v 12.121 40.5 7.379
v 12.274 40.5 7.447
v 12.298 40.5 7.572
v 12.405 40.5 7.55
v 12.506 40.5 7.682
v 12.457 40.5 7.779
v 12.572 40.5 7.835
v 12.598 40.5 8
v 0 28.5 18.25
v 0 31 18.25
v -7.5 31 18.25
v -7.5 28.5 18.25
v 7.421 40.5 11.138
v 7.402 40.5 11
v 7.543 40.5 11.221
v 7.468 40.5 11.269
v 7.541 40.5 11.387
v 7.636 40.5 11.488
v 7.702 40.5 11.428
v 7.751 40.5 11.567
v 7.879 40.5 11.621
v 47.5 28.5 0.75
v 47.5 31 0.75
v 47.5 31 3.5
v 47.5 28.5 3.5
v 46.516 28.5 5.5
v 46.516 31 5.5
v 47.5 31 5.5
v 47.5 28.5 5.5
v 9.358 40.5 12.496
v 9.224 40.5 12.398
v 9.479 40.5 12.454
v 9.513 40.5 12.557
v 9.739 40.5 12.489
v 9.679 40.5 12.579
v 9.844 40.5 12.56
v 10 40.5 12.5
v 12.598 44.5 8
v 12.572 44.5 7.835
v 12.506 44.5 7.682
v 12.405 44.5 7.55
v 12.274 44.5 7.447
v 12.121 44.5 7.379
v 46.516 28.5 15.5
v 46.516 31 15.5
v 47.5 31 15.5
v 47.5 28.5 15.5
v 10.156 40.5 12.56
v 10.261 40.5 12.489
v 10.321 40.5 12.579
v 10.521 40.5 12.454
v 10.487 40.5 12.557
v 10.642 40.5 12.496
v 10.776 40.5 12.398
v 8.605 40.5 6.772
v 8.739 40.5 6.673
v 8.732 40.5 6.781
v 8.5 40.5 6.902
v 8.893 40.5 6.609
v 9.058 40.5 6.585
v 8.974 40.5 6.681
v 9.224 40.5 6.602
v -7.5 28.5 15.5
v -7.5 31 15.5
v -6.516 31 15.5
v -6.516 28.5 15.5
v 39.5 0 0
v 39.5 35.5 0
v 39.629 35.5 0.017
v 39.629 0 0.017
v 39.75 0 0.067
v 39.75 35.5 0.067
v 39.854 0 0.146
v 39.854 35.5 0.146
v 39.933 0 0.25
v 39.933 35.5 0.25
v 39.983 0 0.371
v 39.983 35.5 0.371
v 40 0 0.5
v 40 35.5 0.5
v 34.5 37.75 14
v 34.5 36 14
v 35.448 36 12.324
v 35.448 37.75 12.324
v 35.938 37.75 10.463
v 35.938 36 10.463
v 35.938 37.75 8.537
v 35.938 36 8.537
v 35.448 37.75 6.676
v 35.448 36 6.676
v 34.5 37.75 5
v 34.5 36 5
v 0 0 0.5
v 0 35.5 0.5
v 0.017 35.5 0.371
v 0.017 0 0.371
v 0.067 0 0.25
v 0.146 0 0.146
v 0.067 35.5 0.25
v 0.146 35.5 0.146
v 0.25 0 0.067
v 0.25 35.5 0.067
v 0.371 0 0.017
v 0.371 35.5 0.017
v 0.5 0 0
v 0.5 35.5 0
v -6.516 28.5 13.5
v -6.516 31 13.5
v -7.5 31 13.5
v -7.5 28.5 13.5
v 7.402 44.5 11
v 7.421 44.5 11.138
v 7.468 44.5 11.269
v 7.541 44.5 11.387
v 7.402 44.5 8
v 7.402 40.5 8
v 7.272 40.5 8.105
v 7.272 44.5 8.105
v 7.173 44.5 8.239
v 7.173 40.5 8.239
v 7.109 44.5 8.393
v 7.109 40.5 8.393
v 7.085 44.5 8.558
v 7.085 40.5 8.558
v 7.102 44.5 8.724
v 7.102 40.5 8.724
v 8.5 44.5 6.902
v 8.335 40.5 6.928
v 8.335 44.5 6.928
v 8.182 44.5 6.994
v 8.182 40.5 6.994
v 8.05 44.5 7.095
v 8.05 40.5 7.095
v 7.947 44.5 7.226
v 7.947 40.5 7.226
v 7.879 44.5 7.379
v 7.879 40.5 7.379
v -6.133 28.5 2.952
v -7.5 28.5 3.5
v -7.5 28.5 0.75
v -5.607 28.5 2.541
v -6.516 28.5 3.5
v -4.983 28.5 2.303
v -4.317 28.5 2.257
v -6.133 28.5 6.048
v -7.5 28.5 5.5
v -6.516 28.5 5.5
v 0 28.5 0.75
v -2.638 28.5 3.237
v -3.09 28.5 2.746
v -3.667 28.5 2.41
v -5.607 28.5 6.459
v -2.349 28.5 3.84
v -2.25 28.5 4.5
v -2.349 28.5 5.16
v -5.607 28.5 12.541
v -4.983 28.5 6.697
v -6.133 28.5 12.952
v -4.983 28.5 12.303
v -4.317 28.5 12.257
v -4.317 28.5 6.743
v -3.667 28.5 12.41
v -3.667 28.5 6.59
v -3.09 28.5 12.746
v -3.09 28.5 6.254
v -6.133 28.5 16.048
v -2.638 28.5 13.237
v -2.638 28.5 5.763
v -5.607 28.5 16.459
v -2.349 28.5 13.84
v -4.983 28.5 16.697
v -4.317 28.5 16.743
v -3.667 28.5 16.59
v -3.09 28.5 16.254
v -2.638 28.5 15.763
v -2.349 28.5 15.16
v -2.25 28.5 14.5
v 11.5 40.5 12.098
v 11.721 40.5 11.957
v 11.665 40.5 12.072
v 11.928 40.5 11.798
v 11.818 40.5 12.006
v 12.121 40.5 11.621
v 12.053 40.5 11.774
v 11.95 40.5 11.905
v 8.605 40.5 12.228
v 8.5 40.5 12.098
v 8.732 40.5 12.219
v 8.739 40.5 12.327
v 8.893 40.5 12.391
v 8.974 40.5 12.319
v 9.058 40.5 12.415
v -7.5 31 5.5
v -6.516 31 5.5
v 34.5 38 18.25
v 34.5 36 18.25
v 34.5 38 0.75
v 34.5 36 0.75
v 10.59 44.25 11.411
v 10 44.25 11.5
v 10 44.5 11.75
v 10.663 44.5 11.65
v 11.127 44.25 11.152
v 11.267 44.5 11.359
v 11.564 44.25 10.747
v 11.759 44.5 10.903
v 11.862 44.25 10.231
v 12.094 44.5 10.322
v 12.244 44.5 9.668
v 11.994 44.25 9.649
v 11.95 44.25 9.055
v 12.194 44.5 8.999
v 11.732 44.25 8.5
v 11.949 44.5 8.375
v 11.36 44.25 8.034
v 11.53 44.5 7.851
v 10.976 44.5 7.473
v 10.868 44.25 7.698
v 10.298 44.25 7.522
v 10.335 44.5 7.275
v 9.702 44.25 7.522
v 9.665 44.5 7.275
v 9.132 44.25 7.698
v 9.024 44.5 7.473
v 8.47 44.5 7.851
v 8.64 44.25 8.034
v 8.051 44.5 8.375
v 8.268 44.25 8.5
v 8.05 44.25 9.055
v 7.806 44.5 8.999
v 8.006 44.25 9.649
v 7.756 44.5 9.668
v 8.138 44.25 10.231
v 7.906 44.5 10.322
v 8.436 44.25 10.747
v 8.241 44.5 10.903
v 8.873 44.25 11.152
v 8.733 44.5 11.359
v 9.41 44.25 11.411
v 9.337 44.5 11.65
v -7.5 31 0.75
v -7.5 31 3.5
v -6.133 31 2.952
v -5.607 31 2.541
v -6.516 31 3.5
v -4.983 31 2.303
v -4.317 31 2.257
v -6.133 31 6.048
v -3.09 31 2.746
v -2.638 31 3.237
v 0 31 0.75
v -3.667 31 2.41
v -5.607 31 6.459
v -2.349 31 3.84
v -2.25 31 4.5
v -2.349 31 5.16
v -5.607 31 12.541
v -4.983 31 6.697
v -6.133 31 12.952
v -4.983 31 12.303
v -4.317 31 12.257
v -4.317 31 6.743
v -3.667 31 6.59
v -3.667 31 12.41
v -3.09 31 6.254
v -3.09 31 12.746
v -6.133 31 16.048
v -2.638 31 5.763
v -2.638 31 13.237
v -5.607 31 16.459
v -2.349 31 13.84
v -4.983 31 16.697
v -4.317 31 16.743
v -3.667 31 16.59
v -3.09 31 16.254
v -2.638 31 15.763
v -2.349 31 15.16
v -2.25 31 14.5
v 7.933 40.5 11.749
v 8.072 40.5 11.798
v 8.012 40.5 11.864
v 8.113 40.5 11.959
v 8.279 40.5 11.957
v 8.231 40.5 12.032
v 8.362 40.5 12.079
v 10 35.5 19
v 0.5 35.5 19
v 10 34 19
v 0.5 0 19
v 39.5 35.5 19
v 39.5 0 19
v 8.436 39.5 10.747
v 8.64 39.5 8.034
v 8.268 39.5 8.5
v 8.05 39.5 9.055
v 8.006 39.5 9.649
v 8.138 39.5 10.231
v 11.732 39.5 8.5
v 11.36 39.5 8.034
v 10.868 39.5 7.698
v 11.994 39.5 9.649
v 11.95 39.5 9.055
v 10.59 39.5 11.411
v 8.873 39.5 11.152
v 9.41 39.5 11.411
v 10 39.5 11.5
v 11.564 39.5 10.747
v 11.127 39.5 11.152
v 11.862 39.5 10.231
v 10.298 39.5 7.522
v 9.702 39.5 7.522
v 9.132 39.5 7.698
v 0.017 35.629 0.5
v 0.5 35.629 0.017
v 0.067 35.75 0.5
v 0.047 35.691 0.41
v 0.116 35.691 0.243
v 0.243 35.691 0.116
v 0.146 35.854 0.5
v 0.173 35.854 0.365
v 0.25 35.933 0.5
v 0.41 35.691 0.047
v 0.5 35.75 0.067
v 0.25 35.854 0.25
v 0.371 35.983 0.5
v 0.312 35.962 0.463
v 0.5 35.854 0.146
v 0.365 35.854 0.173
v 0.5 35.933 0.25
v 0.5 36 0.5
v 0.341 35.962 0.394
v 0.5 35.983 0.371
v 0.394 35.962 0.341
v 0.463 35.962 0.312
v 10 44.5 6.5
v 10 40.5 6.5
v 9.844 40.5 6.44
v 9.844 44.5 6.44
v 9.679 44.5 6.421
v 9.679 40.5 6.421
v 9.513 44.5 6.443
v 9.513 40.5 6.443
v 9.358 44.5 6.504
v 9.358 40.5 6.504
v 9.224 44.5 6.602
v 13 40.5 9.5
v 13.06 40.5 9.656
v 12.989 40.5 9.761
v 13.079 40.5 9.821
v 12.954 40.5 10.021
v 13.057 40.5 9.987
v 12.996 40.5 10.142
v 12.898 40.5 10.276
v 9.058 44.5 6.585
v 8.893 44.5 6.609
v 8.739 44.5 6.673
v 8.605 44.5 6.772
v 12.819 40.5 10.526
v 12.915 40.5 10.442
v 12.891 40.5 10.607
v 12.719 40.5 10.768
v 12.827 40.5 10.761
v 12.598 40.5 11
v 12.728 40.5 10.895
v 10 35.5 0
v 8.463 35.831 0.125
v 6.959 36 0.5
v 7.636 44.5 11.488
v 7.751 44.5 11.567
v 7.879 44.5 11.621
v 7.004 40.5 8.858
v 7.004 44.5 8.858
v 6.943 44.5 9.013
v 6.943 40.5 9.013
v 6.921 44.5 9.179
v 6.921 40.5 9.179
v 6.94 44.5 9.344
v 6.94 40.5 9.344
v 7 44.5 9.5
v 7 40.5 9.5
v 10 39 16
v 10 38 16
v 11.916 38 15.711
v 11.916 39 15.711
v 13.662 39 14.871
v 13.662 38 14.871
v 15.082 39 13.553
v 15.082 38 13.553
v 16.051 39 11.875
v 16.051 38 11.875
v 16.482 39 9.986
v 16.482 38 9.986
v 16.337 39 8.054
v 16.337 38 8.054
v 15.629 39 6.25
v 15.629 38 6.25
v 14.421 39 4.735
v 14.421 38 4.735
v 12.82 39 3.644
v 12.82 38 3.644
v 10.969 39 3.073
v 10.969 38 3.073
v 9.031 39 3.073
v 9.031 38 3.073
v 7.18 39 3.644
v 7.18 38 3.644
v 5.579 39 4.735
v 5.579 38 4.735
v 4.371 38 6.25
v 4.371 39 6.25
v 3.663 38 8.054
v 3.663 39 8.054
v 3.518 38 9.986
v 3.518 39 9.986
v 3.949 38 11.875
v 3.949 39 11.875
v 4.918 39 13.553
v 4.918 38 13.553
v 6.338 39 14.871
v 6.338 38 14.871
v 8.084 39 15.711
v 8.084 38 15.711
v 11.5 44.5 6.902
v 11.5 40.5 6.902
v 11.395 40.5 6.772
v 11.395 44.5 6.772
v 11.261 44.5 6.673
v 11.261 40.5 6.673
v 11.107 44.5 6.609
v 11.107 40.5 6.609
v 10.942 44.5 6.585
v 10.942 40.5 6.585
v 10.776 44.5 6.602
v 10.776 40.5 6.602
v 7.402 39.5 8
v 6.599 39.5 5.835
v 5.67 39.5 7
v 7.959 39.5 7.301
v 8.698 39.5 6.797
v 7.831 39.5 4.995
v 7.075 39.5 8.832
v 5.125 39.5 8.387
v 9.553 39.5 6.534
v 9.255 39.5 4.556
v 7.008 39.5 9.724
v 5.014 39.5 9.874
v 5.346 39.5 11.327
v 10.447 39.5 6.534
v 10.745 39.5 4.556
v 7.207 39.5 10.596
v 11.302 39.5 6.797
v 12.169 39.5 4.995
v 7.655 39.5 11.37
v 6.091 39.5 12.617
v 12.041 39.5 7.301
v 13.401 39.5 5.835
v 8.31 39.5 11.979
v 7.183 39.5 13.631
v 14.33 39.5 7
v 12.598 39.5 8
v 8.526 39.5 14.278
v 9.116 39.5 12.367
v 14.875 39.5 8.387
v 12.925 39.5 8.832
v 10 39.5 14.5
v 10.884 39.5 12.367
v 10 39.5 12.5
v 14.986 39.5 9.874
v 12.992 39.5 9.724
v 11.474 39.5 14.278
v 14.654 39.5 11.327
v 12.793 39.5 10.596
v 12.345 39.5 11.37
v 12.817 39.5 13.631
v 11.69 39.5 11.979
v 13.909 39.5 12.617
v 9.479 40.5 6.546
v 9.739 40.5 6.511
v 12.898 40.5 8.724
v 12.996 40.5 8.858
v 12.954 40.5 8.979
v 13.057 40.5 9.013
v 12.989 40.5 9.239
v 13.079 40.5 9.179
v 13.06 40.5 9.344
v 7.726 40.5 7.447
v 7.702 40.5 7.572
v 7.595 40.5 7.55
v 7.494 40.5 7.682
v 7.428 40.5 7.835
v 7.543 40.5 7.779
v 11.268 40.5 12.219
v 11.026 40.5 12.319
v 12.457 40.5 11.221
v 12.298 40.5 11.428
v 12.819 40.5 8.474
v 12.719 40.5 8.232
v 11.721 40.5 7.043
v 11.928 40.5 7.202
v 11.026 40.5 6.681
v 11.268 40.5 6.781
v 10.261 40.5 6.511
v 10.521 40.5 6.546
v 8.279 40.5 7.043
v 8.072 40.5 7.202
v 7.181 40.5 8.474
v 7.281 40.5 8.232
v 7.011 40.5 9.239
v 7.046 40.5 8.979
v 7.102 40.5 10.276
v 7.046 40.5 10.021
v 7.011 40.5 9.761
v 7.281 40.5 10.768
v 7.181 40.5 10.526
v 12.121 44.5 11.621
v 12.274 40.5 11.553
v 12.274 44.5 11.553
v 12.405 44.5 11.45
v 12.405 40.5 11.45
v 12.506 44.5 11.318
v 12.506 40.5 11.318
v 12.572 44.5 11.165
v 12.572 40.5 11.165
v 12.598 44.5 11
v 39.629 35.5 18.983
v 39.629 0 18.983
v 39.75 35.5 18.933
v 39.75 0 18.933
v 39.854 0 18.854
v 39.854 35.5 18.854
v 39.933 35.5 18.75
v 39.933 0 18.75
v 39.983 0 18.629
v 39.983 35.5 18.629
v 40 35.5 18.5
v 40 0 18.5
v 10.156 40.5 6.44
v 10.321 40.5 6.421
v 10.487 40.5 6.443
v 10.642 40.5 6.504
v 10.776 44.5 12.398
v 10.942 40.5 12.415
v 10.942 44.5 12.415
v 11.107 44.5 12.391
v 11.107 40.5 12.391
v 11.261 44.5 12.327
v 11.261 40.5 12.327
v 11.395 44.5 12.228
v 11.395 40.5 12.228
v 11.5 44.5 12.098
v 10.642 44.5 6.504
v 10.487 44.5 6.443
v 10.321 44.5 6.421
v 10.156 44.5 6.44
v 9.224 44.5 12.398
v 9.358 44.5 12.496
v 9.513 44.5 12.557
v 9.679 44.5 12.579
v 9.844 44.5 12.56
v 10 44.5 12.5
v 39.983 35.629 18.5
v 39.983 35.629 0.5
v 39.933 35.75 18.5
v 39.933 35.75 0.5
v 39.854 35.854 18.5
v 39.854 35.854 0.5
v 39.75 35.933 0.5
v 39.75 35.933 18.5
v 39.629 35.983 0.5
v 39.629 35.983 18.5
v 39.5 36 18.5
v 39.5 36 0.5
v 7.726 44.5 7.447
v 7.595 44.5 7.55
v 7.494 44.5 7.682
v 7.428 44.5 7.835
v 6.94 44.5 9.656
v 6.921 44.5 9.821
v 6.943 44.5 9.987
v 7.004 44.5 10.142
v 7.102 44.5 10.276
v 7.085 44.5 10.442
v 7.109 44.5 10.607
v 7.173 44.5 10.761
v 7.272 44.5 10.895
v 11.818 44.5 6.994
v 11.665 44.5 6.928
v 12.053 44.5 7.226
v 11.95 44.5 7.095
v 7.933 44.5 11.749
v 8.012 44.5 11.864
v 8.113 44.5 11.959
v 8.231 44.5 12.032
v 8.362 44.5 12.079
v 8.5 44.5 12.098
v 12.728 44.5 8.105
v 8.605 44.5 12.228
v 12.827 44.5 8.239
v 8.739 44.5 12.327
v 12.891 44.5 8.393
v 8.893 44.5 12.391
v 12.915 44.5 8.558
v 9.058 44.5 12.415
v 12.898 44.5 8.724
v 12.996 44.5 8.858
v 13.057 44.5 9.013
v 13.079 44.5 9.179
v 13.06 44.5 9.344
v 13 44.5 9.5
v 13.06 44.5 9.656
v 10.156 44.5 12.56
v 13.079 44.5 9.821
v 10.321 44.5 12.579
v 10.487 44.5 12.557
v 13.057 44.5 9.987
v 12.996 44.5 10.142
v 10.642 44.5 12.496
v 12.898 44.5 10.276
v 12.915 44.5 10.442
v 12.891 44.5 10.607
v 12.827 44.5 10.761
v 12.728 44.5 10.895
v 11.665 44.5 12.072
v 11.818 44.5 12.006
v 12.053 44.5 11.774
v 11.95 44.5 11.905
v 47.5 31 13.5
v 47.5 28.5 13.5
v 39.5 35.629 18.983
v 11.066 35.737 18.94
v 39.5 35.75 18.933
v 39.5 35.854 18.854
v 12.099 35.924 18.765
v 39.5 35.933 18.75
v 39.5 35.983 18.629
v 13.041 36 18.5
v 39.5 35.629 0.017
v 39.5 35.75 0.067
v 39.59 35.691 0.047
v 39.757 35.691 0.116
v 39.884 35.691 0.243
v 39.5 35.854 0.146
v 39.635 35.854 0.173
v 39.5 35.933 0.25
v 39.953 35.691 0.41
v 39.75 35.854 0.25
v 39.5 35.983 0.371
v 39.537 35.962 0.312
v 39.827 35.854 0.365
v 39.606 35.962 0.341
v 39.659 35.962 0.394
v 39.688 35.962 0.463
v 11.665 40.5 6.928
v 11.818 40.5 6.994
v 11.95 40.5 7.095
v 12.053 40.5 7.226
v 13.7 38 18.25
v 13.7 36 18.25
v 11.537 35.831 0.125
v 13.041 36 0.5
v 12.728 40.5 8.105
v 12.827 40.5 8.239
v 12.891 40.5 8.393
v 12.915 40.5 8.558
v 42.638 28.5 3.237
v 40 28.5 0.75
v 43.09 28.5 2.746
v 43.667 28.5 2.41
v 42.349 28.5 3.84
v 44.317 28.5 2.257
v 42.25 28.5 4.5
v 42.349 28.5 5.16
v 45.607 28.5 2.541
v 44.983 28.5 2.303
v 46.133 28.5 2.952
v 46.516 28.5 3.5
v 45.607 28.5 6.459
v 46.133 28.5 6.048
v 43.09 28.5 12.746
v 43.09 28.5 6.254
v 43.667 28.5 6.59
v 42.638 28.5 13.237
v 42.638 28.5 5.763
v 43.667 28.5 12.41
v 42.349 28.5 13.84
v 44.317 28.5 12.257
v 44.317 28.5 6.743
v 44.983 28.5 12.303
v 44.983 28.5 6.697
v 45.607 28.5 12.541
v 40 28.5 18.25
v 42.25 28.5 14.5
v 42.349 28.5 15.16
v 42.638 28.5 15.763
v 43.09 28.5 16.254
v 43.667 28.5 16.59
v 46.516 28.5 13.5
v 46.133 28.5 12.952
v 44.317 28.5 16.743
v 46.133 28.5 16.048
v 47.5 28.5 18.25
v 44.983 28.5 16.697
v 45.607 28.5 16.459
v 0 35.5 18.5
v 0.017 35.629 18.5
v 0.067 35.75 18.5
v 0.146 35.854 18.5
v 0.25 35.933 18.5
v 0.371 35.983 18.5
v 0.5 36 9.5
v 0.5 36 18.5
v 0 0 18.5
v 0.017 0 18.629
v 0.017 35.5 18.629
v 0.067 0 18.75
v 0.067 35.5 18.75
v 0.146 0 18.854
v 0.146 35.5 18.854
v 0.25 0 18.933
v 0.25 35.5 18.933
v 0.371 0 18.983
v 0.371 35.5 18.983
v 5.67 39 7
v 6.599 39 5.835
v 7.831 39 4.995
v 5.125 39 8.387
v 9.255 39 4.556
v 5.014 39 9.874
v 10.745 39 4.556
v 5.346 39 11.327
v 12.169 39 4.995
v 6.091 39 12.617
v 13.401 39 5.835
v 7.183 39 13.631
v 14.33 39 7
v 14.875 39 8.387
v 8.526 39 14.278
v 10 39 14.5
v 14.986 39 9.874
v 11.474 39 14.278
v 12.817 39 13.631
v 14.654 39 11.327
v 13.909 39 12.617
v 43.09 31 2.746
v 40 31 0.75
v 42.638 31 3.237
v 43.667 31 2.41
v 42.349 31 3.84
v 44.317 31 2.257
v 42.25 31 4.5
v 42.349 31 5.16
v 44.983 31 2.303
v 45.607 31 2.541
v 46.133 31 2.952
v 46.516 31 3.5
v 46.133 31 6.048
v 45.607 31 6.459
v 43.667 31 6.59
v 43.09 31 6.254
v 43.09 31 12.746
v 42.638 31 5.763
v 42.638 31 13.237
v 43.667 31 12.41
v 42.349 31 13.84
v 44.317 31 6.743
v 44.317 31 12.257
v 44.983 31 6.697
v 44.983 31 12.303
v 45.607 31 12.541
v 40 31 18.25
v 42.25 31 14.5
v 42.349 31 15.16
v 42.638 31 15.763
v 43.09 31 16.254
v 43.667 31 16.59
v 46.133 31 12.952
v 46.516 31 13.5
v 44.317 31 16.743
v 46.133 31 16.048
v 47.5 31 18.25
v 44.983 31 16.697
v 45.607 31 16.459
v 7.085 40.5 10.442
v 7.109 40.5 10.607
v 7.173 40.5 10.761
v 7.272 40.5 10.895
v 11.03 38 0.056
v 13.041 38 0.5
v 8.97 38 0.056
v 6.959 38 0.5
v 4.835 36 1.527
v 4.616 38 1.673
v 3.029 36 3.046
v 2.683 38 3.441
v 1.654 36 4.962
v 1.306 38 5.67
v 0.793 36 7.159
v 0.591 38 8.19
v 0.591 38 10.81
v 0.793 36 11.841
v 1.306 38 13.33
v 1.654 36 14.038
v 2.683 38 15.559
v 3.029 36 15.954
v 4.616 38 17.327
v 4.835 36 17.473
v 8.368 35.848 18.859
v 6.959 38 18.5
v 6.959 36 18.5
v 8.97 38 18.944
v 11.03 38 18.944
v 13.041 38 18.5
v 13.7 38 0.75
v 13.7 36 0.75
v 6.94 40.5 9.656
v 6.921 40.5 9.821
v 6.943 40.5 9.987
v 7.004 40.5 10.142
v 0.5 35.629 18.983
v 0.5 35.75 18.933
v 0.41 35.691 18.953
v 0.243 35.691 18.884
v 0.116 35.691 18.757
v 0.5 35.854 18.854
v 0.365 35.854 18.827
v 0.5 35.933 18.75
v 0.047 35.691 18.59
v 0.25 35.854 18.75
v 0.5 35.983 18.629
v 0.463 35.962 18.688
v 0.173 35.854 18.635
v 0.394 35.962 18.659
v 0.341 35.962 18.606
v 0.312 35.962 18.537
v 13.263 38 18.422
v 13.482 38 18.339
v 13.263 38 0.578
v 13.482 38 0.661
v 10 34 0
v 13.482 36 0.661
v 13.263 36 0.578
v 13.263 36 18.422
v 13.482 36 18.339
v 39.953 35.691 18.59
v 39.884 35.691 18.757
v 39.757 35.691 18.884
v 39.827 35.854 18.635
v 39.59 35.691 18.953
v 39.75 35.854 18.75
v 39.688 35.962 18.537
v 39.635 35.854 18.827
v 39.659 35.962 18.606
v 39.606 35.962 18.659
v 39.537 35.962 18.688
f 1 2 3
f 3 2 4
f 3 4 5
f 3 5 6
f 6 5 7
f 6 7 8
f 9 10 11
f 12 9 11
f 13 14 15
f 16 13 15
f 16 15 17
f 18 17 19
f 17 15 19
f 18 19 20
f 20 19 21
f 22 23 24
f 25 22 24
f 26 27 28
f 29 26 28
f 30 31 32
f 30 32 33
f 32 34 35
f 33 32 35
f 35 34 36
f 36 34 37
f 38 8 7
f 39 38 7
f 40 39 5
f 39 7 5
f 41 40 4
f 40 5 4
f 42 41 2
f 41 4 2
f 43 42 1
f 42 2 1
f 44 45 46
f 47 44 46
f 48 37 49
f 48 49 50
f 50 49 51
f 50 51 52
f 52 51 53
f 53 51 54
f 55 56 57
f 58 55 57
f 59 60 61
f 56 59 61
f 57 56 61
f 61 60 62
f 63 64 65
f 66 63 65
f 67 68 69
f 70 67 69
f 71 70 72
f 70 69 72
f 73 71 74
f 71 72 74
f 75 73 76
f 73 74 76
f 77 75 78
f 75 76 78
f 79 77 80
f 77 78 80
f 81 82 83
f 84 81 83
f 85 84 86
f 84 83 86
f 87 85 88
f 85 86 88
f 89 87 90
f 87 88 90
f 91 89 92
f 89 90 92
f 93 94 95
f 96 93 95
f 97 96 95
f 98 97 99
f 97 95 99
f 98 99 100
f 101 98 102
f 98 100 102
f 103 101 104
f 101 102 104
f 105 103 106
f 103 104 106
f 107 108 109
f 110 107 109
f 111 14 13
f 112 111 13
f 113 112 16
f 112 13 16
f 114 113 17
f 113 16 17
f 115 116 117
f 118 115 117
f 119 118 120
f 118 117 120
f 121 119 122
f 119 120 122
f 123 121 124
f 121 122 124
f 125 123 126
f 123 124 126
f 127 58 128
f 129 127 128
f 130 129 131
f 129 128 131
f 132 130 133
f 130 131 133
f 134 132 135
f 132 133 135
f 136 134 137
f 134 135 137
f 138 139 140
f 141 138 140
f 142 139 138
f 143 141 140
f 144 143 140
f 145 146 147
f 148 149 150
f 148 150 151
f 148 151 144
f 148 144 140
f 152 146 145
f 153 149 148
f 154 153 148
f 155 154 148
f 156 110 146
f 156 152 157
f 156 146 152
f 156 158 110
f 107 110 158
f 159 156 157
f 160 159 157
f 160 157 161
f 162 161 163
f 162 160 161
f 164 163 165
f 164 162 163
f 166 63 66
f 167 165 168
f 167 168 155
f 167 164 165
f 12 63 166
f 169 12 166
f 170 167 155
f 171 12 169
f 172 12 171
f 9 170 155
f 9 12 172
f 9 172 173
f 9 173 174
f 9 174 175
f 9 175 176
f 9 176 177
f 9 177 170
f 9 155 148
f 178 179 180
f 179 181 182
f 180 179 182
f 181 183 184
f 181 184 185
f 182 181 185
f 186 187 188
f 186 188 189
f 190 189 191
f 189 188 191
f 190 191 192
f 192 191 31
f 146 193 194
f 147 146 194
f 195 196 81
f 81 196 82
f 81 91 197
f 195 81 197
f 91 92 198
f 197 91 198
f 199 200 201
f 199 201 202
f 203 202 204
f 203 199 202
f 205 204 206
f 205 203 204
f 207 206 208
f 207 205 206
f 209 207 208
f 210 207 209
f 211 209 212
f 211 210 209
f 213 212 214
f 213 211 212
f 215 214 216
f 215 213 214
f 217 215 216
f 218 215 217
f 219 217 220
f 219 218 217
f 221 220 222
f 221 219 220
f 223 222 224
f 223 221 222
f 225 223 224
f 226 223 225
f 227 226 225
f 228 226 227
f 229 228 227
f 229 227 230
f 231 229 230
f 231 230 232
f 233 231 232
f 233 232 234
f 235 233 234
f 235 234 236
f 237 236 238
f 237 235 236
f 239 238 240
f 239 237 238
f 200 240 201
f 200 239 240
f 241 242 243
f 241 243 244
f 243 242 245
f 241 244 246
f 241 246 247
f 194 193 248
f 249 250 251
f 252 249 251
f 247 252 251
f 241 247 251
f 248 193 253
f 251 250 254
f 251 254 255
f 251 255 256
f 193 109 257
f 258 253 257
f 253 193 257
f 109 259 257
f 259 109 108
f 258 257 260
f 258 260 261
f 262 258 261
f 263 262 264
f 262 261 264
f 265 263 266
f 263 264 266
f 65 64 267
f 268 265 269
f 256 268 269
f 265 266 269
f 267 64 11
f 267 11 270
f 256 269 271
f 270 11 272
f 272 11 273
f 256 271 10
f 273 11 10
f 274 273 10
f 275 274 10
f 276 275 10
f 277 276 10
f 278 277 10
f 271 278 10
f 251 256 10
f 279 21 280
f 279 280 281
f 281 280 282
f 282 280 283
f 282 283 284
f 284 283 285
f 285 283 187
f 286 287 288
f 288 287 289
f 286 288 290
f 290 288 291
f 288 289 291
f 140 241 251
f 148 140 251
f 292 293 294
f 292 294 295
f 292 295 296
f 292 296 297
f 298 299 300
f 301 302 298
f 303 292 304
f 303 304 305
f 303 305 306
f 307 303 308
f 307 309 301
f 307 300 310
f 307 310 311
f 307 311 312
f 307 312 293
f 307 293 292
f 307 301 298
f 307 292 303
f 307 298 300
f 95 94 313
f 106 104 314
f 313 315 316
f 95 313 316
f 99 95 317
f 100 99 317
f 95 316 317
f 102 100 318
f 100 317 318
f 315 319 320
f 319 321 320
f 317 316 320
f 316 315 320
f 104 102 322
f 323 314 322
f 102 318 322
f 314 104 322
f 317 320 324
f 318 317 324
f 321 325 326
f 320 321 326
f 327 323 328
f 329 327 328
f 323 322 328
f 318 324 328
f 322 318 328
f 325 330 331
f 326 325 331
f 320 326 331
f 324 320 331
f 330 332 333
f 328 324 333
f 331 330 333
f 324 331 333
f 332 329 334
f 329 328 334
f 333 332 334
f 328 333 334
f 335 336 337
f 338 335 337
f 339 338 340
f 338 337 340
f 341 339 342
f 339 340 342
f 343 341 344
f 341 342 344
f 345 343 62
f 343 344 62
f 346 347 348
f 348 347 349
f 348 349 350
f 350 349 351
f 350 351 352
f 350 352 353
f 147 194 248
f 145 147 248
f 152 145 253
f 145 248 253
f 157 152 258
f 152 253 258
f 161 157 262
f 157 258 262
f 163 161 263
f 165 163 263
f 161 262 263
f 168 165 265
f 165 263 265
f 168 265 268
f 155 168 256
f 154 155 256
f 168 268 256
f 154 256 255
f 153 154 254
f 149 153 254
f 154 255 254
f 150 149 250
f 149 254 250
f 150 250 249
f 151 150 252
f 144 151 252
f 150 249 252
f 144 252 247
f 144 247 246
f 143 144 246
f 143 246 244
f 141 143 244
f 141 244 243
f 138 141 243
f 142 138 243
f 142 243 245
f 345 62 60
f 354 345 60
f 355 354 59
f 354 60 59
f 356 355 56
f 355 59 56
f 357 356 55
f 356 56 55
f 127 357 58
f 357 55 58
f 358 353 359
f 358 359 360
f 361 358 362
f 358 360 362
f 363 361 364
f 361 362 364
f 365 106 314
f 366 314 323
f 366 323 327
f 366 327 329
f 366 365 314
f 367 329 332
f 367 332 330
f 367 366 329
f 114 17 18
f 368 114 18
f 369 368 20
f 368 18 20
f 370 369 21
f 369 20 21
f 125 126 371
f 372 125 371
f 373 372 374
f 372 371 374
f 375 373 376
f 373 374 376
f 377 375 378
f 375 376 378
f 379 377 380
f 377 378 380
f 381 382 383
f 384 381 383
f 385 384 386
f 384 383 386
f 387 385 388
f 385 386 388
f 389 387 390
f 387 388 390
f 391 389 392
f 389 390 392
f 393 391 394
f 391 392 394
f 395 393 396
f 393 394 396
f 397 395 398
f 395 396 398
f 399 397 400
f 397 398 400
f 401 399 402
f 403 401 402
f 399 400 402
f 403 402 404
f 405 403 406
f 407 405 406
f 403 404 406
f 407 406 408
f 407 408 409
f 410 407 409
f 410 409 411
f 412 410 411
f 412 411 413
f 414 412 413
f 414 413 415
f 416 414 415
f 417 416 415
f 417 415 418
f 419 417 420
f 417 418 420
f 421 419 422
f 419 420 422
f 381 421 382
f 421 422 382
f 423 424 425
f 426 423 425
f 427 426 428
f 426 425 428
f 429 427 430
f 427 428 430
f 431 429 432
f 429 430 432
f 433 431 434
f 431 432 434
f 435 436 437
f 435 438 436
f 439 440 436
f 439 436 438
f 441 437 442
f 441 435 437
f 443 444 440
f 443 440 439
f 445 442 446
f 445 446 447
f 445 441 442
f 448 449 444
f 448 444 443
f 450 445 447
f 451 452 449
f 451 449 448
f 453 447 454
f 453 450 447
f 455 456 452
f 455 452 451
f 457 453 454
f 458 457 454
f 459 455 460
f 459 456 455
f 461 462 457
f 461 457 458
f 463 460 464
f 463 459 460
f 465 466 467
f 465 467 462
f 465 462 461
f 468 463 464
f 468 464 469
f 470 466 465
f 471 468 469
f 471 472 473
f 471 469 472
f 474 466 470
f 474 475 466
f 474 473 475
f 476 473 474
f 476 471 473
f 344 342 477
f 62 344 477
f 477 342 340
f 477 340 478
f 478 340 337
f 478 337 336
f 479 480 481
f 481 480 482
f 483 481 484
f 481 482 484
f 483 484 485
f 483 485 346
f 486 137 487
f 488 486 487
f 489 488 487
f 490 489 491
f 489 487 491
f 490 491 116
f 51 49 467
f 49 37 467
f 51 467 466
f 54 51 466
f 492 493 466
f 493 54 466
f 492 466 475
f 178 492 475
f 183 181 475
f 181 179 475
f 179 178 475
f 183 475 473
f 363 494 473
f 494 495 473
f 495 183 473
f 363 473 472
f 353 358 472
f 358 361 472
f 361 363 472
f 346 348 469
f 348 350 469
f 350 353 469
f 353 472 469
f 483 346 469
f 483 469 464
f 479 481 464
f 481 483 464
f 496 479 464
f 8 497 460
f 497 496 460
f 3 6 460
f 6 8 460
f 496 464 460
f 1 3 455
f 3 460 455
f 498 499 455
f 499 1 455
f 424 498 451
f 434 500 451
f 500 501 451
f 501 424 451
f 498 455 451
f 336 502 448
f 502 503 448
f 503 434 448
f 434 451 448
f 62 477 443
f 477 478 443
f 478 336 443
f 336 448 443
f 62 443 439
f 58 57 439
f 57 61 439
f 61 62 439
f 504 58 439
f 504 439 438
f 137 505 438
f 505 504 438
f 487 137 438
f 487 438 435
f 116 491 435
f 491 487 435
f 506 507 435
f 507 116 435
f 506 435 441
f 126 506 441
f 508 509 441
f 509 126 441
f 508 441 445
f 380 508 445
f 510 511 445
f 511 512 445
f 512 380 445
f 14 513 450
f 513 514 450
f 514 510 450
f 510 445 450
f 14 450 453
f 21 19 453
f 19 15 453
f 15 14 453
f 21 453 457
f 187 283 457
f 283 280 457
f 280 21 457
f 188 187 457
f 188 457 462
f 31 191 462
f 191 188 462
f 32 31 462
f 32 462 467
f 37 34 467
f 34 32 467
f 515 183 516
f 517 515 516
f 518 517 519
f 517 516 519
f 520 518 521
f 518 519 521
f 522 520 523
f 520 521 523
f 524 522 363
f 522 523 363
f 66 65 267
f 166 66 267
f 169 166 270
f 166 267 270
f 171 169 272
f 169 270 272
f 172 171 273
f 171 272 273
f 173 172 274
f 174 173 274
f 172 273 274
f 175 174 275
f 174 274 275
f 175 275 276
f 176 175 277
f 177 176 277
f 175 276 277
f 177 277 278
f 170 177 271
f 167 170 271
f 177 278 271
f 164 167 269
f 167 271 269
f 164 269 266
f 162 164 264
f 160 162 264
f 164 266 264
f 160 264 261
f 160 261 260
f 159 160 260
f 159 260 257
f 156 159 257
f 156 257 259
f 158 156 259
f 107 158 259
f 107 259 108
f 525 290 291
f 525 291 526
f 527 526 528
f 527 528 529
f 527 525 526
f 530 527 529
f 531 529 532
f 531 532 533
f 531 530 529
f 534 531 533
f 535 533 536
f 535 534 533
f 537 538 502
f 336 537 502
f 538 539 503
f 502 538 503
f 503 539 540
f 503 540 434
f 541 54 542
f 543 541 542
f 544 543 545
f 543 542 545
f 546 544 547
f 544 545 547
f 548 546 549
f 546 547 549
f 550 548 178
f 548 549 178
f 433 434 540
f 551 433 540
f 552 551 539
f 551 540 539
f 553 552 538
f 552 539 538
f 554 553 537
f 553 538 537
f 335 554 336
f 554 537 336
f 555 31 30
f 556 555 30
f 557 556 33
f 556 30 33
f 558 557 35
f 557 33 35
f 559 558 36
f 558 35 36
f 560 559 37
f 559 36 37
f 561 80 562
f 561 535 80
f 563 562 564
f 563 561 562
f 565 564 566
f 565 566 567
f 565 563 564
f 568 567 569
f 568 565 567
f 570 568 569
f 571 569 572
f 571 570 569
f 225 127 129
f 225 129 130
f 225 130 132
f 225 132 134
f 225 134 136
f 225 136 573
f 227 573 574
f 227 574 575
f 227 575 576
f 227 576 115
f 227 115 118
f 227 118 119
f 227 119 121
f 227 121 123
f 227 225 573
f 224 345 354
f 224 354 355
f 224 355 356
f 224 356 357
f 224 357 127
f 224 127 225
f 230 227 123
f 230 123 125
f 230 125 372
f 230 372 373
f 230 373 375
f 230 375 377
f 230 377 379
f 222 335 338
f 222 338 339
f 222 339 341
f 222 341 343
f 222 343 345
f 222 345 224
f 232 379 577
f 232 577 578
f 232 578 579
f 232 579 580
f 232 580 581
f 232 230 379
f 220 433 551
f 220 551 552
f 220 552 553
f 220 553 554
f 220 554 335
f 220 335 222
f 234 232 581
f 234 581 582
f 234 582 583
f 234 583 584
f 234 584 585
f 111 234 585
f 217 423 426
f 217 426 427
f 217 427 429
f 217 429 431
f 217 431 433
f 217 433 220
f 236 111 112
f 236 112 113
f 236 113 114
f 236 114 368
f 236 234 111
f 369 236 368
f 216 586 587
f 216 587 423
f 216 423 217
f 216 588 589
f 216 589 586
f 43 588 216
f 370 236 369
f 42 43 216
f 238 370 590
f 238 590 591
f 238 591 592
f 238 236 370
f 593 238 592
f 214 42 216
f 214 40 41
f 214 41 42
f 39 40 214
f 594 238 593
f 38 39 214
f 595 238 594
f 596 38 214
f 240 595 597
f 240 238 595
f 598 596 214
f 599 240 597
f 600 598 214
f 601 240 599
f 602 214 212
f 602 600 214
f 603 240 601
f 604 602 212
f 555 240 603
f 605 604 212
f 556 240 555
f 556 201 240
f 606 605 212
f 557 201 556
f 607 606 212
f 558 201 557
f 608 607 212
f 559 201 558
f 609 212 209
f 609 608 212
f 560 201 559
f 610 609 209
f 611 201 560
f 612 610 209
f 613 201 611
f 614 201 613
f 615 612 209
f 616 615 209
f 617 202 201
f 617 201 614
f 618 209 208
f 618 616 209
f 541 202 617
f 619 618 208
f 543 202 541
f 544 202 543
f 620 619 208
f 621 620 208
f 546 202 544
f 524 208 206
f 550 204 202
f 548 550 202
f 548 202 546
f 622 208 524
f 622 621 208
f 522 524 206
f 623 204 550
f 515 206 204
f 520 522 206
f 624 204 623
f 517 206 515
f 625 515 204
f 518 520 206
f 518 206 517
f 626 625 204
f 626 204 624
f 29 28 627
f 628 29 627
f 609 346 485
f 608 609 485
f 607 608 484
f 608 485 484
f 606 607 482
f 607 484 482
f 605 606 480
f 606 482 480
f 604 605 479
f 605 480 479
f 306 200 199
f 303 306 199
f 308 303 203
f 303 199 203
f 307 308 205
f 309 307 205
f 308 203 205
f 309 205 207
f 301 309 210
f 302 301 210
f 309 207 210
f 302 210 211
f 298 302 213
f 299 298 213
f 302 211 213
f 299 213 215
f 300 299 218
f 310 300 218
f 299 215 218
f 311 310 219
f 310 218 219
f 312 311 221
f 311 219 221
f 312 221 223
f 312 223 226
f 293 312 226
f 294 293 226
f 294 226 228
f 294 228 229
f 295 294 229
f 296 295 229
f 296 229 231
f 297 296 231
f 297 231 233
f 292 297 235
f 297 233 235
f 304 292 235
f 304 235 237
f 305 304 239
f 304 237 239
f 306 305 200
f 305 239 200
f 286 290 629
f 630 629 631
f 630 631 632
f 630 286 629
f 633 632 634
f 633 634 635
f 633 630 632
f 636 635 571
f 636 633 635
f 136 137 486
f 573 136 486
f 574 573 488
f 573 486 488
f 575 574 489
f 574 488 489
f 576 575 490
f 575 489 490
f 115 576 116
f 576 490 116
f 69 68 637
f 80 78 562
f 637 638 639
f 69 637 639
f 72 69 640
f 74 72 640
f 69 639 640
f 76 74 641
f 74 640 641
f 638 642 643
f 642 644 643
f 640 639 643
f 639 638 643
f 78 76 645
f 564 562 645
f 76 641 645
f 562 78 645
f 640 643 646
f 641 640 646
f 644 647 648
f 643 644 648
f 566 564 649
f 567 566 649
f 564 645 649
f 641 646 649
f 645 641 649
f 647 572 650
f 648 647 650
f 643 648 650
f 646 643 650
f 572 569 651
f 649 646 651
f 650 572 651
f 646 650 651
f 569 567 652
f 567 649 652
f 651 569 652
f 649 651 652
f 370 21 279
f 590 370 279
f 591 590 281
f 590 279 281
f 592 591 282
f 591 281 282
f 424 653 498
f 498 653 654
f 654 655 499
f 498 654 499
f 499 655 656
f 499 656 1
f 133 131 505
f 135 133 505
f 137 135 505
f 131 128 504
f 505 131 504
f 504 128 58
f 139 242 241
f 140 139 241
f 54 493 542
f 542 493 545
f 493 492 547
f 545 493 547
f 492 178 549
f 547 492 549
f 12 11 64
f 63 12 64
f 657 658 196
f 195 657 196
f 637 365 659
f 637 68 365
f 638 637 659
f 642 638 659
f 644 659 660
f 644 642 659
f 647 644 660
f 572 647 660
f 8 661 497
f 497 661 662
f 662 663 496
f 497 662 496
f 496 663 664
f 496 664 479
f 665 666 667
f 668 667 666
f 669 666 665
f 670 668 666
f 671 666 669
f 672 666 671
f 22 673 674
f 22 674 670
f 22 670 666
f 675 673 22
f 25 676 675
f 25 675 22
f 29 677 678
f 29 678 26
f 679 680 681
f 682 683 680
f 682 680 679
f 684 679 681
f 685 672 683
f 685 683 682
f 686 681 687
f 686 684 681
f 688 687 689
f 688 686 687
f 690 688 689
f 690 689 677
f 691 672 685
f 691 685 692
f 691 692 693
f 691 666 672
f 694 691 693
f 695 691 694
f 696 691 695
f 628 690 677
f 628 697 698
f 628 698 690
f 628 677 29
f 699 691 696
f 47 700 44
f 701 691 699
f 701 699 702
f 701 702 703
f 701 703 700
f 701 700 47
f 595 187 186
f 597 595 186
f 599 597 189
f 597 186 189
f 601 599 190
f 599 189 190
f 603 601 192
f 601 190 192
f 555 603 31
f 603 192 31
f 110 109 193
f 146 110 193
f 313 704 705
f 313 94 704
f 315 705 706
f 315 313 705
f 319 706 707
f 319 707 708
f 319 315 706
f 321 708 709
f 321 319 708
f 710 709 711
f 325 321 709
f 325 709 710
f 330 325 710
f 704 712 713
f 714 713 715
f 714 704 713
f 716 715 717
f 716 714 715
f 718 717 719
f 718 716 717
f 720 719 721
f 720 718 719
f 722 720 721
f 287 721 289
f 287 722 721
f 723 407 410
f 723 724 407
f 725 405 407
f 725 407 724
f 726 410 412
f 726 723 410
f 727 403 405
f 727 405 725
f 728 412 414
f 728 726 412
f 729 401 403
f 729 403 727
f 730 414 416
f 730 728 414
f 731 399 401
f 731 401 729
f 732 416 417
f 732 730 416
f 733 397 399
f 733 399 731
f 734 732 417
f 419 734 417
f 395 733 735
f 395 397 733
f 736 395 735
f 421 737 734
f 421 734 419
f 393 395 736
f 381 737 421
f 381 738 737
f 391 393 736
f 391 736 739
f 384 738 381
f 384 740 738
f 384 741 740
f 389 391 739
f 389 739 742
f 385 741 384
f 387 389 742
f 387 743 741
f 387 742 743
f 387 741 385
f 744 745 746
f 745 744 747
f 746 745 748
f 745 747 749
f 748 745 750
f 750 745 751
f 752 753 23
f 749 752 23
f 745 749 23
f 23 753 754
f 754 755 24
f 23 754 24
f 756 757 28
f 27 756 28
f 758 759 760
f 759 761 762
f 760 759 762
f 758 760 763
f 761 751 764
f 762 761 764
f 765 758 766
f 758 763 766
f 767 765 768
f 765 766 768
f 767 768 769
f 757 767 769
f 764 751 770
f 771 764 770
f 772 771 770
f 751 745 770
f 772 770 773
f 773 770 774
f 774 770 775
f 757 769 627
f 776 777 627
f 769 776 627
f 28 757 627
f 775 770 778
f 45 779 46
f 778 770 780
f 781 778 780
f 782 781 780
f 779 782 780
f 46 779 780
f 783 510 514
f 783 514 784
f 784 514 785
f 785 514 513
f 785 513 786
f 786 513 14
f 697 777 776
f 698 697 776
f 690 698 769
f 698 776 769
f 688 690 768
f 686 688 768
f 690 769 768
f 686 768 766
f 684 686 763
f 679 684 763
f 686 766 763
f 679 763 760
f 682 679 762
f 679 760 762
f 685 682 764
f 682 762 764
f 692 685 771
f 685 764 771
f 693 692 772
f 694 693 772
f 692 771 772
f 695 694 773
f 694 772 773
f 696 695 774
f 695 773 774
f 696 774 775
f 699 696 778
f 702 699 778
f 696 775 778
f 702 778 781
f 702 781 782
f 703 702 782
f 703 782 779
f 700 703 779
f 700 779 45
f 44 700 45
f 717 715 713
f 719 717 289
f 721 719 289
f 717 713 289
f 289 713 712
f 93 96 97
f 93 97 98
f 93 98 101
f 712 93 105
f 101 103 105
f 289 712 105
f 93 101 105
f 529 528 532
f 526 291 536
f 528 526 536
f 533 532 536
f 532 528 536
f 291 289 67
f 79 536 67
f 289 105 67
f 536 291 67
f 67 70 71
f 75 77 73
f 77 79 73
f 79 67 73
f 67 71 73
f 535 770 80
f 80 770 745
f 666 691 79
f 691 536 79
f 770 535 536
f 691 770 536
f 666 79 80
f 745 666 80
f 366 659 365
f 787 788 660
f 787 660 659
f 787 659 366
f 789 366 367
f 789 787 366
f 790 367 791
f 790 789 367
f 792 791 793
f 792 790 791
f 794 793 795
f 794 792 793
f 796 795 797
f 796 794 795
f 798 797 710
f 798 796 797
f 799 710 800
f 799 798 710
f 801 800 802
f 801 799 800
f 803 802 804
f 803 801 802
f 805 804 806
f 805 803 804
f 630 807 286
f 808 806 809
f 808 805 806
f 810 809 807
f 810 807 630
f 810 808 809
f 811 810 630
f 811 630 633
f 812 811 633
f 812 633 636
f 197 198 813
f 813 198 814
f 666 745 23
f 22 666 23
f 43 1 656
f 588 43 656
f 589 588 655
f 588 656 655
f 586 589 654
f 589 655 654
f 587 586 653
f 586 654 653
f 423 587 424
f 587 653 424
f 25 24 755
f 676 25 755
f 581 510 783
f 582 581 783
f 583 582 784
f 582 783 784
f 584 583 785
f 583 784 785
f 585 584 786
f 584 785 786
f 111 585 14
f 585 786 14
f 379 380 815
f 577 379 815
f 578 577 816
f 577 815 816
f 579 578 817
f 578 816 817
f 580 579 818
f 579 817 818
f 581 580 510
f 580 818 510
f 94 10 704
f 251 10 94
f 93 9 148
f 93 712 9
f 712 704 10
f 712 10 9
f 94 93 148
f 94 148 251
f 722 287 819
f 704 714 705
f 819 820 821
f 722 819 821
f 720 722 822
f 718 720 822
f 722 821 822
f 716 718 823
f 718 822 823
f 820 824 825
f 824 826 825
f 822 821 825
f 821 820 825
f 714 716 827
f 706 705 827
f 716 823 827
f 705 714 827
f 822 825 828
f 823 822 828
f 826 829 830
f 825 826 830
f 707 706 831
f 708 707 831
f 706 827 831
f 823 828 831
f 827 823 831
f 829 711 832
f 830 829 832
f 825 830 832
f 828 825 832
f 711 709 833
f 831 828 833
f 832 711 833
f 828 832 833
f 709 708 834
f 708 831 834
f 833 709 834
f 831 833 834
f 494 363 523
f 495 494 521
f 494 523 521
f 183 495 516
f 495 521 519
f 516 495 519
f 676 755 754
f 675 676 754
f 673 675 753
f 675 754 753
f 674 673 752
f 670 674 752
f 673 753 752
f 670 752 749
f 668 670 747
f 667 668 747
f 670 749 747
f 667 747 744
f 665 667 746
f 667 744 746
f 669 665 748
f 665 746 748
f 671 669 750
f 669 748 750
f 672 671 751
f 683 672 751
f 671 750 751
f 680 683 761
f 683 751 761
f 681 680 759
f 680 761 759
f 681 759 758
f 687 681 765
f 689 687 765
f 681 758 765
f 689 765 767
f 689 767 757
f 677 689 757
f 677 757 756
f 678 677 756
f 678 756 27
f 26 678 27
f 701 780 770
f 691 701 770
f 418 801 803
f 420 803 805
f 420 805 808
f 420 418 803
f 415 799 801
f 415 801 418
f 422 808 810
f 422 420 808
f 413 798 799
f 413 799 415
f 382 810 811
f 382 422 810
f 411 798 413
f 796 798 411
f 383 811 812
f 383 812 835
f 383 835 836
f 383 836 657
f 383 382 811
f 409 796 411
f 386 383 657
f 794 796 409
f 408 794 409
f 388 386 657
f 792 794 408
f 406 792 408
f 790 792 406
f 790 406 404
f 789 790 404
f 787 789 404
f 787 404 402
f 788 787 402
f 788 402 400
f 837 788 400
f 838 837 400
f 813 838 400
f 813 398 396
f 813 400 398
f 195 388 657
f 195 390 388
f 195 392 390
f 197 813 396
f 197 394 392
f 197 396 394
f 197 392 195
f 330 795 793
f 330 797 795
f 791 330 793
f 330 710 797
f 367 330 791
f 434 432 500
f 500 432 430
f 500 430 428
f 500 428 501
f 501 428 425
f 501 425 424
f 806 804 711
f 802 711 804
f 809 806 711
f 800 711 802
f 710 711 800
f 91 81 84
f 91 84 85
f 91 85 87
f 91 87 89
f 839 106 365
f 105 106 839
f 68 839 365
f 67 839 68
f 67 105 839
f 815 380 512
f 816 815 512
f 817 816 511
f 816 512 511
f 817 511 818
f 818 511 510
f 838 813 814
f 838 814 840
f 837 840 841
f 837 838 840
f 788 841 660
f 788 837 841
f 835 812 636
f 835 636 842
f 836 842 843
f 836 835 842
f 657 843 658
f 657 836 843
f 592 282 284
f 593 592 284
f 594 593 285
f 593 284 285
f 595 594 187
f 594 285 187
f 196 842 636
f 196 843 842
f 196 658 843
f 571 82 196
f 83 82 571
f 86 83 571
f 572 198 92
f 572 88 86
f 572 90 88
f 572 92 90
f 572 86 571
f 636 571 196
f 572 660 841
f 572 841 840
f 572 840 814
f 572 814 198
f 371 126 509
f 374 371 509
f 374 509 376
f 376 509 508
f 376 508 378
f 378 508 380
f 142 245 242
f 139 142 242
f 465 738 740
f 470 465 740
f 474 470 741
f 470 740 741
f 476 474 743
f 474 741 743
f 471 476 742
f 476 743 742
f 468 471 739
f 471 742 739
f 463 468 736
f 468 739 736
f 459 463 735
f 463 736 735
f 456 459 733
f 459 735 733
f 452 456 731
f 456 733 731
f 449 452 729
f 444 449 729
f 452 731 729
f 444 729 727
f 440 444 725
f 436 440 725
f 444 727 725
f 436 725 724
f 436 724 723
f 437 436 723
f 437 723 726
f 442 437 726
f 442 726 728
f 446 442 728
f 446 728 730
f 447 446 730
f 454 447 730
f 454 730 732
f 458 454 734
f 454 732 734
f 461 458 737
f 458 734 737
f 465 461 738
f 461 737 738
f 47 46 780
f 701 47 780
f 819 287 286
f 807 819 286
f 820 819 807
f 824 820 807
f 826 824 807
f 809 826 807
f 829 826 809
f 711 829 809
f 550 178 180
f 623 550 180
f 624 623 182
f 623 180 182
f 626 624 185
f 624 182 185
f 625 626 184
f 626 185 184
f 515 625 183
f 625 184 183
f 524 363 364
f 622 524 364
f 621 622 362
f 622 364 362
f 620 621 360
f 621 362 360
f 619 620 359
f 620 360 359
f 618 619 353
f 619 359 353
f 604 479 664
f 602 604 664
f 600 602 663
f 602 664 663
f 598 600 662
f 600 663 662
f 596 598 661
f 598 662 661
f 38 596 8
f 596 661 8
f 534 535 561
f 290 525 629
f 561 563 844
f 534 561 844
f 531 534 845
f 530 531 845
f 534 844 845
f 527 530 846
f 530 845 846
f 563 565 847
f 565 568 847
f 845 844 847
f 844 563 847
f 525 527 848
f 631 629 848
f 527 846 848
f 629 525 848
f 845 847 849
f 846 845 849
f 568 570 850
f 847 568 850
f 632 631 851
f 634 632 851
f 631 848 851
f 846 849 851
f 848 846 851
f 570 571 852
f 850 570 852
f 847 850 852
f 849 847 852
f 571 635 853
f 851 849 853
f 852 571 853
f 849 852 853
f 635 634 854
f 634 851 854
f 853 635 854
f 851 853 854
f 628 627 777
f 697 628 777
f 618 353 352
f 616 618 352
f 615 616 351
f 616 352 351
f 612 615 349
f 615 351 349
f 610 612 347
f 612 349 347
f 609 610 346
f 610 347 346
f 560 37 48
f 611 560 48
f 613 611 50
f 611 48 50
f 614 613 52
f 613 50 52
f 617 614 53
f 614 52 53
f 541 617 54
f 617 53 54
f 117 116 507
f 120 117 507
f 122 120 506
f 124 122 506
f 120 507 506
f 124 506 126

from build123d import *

# Parameters (mm, degrees)
CROQUIS1_W              = 40
CROQUIS1_H              = 19
SALIENTE_EXTRUIR1_DEPTH = 36
SALIENTE_EXTRUIR2_DEPTH = 2.5
REDONDEO1_R             = 0.5
REDONDEO2_R             = 0.5
SALIENTE_EXTRUIR3_DEPTH = 2
SALIENTE_EXTRUIR4_DEPTH = 2
CROQUIS5_R              = 6.5
SALIENTE_EXTRUIR5_DEPTH = 1
CROQUIS6_R              = 5
SALIENTE_EXTRUIR6_DEPTH = 0.5
CROQUIS7_R              = 3
SALIENTE_EXTRUIR7_DEPTH = 5
SALIENTE_EXTRUIR8_START = -4
CROQUIS8_R              = 3
SALIENTE_EXTRUIR8_DEPTH = 4
CROQUIS9_R              = 2
CORTAR_EXTRUIR1_DEPTH   = 5
CHAFL_N1_SIZE           = 0.25
SALIENTE_EXTRUIR9_DEPTH = 1.75


with BuildPart() as part:
    # Croquis1 → Saliente-Extruir1 (new body)
    with BuildSketch(Plane(origin=(0, 0, 0), x_dir=(1, 0, 0), z_dir=(0, 1, 0))):
        with Locations((20, -9.5)):
            Rectangle(CROQUIS1_W, CROQUIS1_H)
    extrude(amount=SALIENTE_EXTRUIR1_DEPTH)

    # Croquis2 → Saliente-Extruir2 (add)
    with BuildSketch(Plane(origin=(0, 31, 0), x_dir=(-1, 0, 0), z_dir=(0, 1, 0))):
        with BuildLine():
            ThreePointArc((-46.515564437, 3.5), (-42.25, 4.5), (-46.515564437, 5.5))
            Line((-46.515564437, 5.5), (-47.5, 5.5))
            Line((-47.5, 5.5), (-47.5, 13.5))
            Line((-47.5, 13.5), (-46.515564437, 13.5))
            ThreePointArc((-46.515564437, 13.5), (-42.25, 14.5), (-46.515564437, 15.5))
            Line((-46.515564437, 15.5), (-47.5, 15.5))
            Line((-47.5, 15.5), (-47.5, 18.25))
            Line((-47.5, 18.25), (-40, 18.25))
            Line((-40, 18.25), (-40, 0.75))
            Line((-40, 0.75), (-47.5, 0.75))
            Line((-47.5, 0.75), (-47.5, 3.5))
            Line((-47.5, 3.5), (-46.515564437, 3.5))
        make_face()
        with BuildLine():
            Line((6.515564437, 13.5), (7.5, 13.5))
            Line((7.5, 13.5), (7.5, 5.5))
            Line((7.5, 5.5), (6.515564437, 5.5))
            ThreePointArc((6.515564437, 5.5), (2.25, 4.5), (6.515564437, 3.5))
            Line((6.515564437, 3.5), (7.5, 3.5))
            Line((7.5, 3.5), (7.5, 0.75))
            Line((7.5, 0.75), (0, 0.75))
            Line((0, 0.75), (0, 18.25))
            Line((0, 18.25), (7.5, 18.25))
            Line((7.5, 18.25), (7.5, 15.5))
            Line((7.5, 15.5), (6.515564437, 15.5))
            ThreePointArc((6.515564437, 15.5), (2.25, 14.5), (6.515564437, 13.5))
        make_face()
    extrude(amount=-SALIENTE_EXTRUIR2_DEPTH)

    # Redondeo1
    redondeo1_edges = [part.edges().sort_by_distance(p)[0] for p in [
        (0, 18, 0),
        (40, 18, 0),
        (40, 18, 19),
        (0, 18, 19),
    ]]
    fillet(redondeo1_edges, radius=REDONDEO1_R)

    # Redondeo2
    redondeo2_edges = [part.edges().sort_by_distance(p)[0] for p in [
        (0, 36, 9.5),
        (20, 36, 0),
        (20, 36, 19),
        (40, 36, 9.5),
        (39.853553391, 36, 18.853553391),
        (39.853553391, 36, 0.146446609),
        (0.146446609, 36, 18.853553391),
        (0.146446609, 36, 0.146446609),
    ]]
    fillet(redondeo2_edges, radius=REDONDEO2_R)

    # Croquis3 → Saliente-Extruir3 (add)
    with BuildSketch(Plane(origin=(0, 36, 0), x_dir=(1, 0, 0), z_dir=(0, 1, 0))):
        with BuildLine():
            Line((34.5, -18.25), (34.5, -0.75))
            Line((34.5, -0.75), (14.5, -0.75))
            Line((14.5, -0.75), (13.699662147, -0.75))
            ThreePointArc((13.699662147, -0.75), (17.918231823, -4.25103774), (19.5, -9.5))
            ThreePointArc((19.5, -9.5), (17.918231823, -14.74896226), (13.699662147, -18.25))
            Line((13.699662147, -18.25), (14.5, -18.25))
            Line((14.5, -18.25), (34.5, -18.25))
        make_face()
    extrude(amount=SALIENTE_EXTRUIR3_DEPTH)

    # Croquis4 → Saliente-Extruir4 (add, symmetric)
    with BuildSketch(Plane(origin=(0, 36, 0), x_dir=(1, 0, 0), z_dir=(0, 1, 0))):
        with BuildLine():
            ThreePointArc((19.5, -9.5), (17.918231823, -4.25103774), (13.699662147, -0.75))
            ThreePointArc((13.699662147, -0.75), (13.3728388, -0.618898805), (13.041381265, -0.5))
            Line((13.041381265, -0.5), (6.958618735, -0.5))
            ThreePointArc((6.958618735, -0.5), (0.5, -9.5), (6.958618735, -18.5))
            Line((6.958618735, -18.5), (13.041381265, -18.5))
            ThreePointArc((13.041381265, -18.5), (13.3728388, -18.381101195), (13.699662147, -18.25))
            ThreePointArc((13.699662147, -18.25), (17.918231823, -14.74896226), (19.5, -9.5))
        make_face()
        with BuildLine():
            ThreePointArc((6.958618735, -18.5), (10, -19), (13.041381265, -18.5))
            Line((13.041381265, -18.5), (6.958618735, -18.5))
        make_face()
        with BuildLine():
            Line((6.958618735, -0.5), (13.041381265, -0.5))
            ThreePointArc((13.041381265, -0.5), (10, 0), (6.958618735, -0.5))
        make_face()
    extrude(amount=SALIENTE_EXTRUIR4_DEPTH, both=True)

    # Croquis5 → Saliente-Extruir5 (add)
    with BuildSketch(Plane(origin=(0, 38, 0), x_dir=(1, 0, 0), z_dir=(0, 1, 0))):
        with Locations(Location((10, -9.5, 0), (0, 0, 270))):
            Circle(CROQUIS5_R)
    extrude(amount=SALIENTE_EXTRUIR5_DEPTH)

    # Croquis6 → Saliente-Extruir6 (add)
    with BuildSketch(Plane(origin=(0, 39, 0), x_dir=(1, 0, 0), z_dir=(0, 1, 0))):
        with Locations(Location((10, -9.5, 0), (0, 0, 270))):
            Circle(CROQUIS6_R)
    extrude(amount=SALIENTE_EXTRUIR6_DEPTH)

    # Croquis7 → Saliente-Extruir7 (add)
    with BuildSketch(Plane(origin=(0, 39.5, 0), x_dir=(1, 0, 0), z_dir=(0, 1, 0))):
        with Locations(Location((10, -9.5, 0), (0, 0, 270))):
            Circle(CROQUIS7_R)
    extrude(amount=SALIENTE_EXTRUIR7_DEPTH)

    # Croquis8 → Saliente-Extruir8 (add)
    with BuildSketch(Plane(origin=(0, 44.5, 0), x_dir=(1, 0, 0), z_dir=(0, 1, 0)).offset(SALIENTE_EXTRUIR8_START)):
        with Locations(Location((10, -9.5, 0), (0, 0, 270))):
            Circle(CROQUIS8_R)
        with BuildLine():
            ThreePointArc((8.5, -6.901923789), (8.11283957, -7.040604645), (7.878679656, -7.378679656))
            ThreePointArc((7.878679656, -7.378679656), (8.173715713, -7.119939979), (8.5, -6.901923789))
        make_face()
        with BuildLine():
            ThreePointArc((9.223542865, -6.602222521), (8.81368136, -6.635973449), (8.5, -6.901923789))
            ThreePointArc((8.5, -6.901923789), (8.851949703, -6.728361402), (9.223542865, -6.602222521))
        make_face()
        with BuildLine():
            ThreePointArc((10, -6.5), (9.595368804, -6.42652093), (9.223542865, -6.602222521))
            ThreePointArc((9.223542865, -6.602222521), (9.608421423, -6.525665416), (10, -6.5))
        make_face()
        with BuildLine():
            ThreePointArc((10.776457135, -6.602222521), (10.404631196, -6.42652093), (10, -6.5))
            ThreePointArc((10, -6.5), (10.391578577, -6.525665416), (10.776457135, -6.602222521))
        make_face()
        with BuildLine():
            ThreePointArc((11.5, -6.901923789), (11.18631864, -6.635973449), (10.776457135, -6.602222521))
            ThreePointArc((10.776457135, -6.602222521), (11.148050297, -6.728361402), (11.5, -6.901923789))
        make_face()
        with BuildLine():
            ThreePointArc((12.121320344, -7.378679656), (11.88716043, -7.040604645), (11.5, -6.901923789))
            ThreePointArc((11.5, -6.901923789), (11.826284287, -7.119939979), (12.121320344, -7.378679656))
        make_face()
        with BuildLine():
            ThreePointArc((12.598076211, -8), (12.771638598, -8.351949703), (12.897777479, -8.723542865))
            ThreePointArc((12.897777479, -8.723542865), (12.864026551, -8.31368136), (12.598076211, -8))
        make_face()
        with BuildLine():
            ThreePointArc((12.897777479, -8.723542865), (12.974334584, -9.108421423), (13, -9.5))
            ThreePointArc((13, -9.5), (13.07347907, -9.095368804), (12.897777479, -8.723542865))
        make_face()
        with BuildLine():
            ThreePointArc((12.121320344, -7.378679656), (12.380060021, -7.673715713), (12.598076211, -8))
            ThreePointArc((12.598076211, -8), (12.459395355, -7.61283957), (12.121320344, -7.378679656))
        make_face()
        with BuildLine():
            ThreePointArc((7.878679656, -7.378679656), (7.540604645, -7.61283957), (7.401923789, -8))
            ThreePointArc((7.401923789, -8), (7.619939979, -7.673715713), (7.878679656, -7.378679656))
        make_face()
        with BuildLine():
            ThreePointArc((7.401923789, -11), (7.440963384, -11.204433973), (7.540604645, -11.38716043))
            ThreePointArc((7.540604645, -11.38716043), (7.691315793, -11.530699585), (7.878679656, -11.621320344))
            ThreePointArc((7.878679656, -11.621320344), (7.619939979, -11.326284287), (7.401923789, -11))
        make_face()
        with BuildLine():
            ThreePointArc((7.102222521, -10.276457135), (7.135973449, -10.68631864), (7.401923789, -11))
            ThreePointArc((7.401923789, -11), (7.228361402, -10.648050297), (7.102222521, -10.276457135))
        make_face()
        with BuildLine():
            ThreePointArc((7, -9.5), (6.92652093, -9.904631196), (7.102222521, -10.276457135))
            ThreePointArc((7.102222521, -10.276457135), (7.025665416, -9.891578577), (7, -9.5))
        make_face()
        with BuildLine():
            ThreePointArc((7.102222521, -8.723542865), (6.92652093, -9.095368804), (7, -9.5))
            ThreePointArc((7, -9.5), (7.025665416, -9.108421423), (7.102222521, -8.723542865))
        make_face()
        with BuildLine():
            ThreePointArc((7.401923789, -8), (7.135973449, -8.31368136), (7.102222521, -8.723542865))
            ThreePointArc((7.102222521, -8.723542865), (7.228361402, -8.351949703), (7.401923789, -8))
        make_face()
        with BuildLine():
            ThreePointArc((7.878679656, -11.621320344), (7.969300415, -11.808684207), (8.11283957, -11.959395355))
            ThreePointArc((8.11283957, -11.959395355), (8.295566027, -12.059036616), (8.5, -12.098076211))
            ThreePointArc((8.5, -12.098076211), (8.173715713, -11.880060021), (7.878679656, -11.621320344))
        make_face()
        with BuildLine():
            ThreePointArc((9.223542865, -12.397777479), (8.851949703, -12.271638598), (8.5, -12.098076211))
            ThreePointArc((8.5, -12.098076211), (8.81368136, -12.364026551), (9.223542865, -12.397777479))
        make_face()
        with BuildLine():
            ThreePointArc((10, -12.5), (9.608421423, -12.474334584), (9.223542865, -12.397777479))
            ThreePointArc((9.223542865, -12.397777479), (9.595368804, -12.57347907), (10, -12.5))
        make_face()
        with BuildLine():
            ThreePointArc((10.776457135, -12.397777479), (10.391578577, -12.474334584), (10, -12.5))
            ThreePointArc((10, -12.5), (10.404631196, -12.57347907), (10.776457135, -12.397777479))
        make_face()
        with BuildLine():
            ThreePointArc((11.5, -12.098076211), (11.148050297, -12.271638598), (10.776457135, -12.397777479))
            ThreePointArc((10.776457135, -12.397777479), (11.18631864, -12.364026551), (11.5, -12.098076211))
        make_face()
        with BuildLine():
            ThreePointArc((12.121320344, -11.621320344), (11.826284287, -11.880060021), (11.5, -12.098076211))
            ThreePointArc((11.5, -12.098076211), (11.88716043, -11.959395355), (12.121320344, -11.621320344))
        make_face()
        with BuildLine():
            ThreePointArc((12.598076211, -11), (12.380060021, -11.326284287), (12.121320344, -11.621320344))
            ThreePointArc((12.121320344, -11.621320344), (12.459395355, -11.38716043), (12.598076211, -11))
        make_face()
        with BuildLine():
            ThreePointArc((12.897777479, -10.276457135), (12.771638598, -10.648050297), (12.598076211, -11))
            ThreePointArc((12.598076211, -11), (12.864026551, -10.68631864), (12.897777479, -10.276457135))
        make_face()
        with BuildLine():
            ThreePointArc((13, -9.5), (12.974334584, -9.891578577), (12.897777479, -10.276457135))
            ThreePointArc((12.897777479, -10.276457135), (13.07347907, -9.904631196), (13, -9.5))
        make_face()
    extrude(amount=SALIENTE_EXTRUIR8_DEPTH)

    # Croquis9 → Cortar-Extruir1 (cut)
    with BuildSketch(Plane(origin=(0, 44.5, 0), x_dir=(1, 0, 0), z_dir=(0, 1, 0))):
        with Locations(Location((10, -9.5, 0), (0, 0, 270))):
            Circle(CROQUIS9_R)
    extrude(amount=-CORTAR_EXTRUIR1_DEPTH, mode=Mode.SUBTRACT)

    # Chaflán1
    chafl_n1_edges = [part.edges().sort_by_distance(p)[0] for p in [
        (10, 44.5, 7.5),
    ]]
    chamfer(chafl_n1_edges, length=CHAFL_N1_SIZE)

    # Croquis10 → Saliente-Extruir9 (add)
    with BuildSketch(Plane(origin=(0, 36, 0), x_dir=(1, 0, 0), z_dir=(0, 1, 0))):
        with BuildLine():
            ThreePointArc((34.5, -14), (36, -9.5), (34.5, -5))
            Line((34.5, -5), (34.5, -14))
        make_face()
    extrude(amount=SALIENTE_EXTRUIR9_DEPTH)


solid = part.part
